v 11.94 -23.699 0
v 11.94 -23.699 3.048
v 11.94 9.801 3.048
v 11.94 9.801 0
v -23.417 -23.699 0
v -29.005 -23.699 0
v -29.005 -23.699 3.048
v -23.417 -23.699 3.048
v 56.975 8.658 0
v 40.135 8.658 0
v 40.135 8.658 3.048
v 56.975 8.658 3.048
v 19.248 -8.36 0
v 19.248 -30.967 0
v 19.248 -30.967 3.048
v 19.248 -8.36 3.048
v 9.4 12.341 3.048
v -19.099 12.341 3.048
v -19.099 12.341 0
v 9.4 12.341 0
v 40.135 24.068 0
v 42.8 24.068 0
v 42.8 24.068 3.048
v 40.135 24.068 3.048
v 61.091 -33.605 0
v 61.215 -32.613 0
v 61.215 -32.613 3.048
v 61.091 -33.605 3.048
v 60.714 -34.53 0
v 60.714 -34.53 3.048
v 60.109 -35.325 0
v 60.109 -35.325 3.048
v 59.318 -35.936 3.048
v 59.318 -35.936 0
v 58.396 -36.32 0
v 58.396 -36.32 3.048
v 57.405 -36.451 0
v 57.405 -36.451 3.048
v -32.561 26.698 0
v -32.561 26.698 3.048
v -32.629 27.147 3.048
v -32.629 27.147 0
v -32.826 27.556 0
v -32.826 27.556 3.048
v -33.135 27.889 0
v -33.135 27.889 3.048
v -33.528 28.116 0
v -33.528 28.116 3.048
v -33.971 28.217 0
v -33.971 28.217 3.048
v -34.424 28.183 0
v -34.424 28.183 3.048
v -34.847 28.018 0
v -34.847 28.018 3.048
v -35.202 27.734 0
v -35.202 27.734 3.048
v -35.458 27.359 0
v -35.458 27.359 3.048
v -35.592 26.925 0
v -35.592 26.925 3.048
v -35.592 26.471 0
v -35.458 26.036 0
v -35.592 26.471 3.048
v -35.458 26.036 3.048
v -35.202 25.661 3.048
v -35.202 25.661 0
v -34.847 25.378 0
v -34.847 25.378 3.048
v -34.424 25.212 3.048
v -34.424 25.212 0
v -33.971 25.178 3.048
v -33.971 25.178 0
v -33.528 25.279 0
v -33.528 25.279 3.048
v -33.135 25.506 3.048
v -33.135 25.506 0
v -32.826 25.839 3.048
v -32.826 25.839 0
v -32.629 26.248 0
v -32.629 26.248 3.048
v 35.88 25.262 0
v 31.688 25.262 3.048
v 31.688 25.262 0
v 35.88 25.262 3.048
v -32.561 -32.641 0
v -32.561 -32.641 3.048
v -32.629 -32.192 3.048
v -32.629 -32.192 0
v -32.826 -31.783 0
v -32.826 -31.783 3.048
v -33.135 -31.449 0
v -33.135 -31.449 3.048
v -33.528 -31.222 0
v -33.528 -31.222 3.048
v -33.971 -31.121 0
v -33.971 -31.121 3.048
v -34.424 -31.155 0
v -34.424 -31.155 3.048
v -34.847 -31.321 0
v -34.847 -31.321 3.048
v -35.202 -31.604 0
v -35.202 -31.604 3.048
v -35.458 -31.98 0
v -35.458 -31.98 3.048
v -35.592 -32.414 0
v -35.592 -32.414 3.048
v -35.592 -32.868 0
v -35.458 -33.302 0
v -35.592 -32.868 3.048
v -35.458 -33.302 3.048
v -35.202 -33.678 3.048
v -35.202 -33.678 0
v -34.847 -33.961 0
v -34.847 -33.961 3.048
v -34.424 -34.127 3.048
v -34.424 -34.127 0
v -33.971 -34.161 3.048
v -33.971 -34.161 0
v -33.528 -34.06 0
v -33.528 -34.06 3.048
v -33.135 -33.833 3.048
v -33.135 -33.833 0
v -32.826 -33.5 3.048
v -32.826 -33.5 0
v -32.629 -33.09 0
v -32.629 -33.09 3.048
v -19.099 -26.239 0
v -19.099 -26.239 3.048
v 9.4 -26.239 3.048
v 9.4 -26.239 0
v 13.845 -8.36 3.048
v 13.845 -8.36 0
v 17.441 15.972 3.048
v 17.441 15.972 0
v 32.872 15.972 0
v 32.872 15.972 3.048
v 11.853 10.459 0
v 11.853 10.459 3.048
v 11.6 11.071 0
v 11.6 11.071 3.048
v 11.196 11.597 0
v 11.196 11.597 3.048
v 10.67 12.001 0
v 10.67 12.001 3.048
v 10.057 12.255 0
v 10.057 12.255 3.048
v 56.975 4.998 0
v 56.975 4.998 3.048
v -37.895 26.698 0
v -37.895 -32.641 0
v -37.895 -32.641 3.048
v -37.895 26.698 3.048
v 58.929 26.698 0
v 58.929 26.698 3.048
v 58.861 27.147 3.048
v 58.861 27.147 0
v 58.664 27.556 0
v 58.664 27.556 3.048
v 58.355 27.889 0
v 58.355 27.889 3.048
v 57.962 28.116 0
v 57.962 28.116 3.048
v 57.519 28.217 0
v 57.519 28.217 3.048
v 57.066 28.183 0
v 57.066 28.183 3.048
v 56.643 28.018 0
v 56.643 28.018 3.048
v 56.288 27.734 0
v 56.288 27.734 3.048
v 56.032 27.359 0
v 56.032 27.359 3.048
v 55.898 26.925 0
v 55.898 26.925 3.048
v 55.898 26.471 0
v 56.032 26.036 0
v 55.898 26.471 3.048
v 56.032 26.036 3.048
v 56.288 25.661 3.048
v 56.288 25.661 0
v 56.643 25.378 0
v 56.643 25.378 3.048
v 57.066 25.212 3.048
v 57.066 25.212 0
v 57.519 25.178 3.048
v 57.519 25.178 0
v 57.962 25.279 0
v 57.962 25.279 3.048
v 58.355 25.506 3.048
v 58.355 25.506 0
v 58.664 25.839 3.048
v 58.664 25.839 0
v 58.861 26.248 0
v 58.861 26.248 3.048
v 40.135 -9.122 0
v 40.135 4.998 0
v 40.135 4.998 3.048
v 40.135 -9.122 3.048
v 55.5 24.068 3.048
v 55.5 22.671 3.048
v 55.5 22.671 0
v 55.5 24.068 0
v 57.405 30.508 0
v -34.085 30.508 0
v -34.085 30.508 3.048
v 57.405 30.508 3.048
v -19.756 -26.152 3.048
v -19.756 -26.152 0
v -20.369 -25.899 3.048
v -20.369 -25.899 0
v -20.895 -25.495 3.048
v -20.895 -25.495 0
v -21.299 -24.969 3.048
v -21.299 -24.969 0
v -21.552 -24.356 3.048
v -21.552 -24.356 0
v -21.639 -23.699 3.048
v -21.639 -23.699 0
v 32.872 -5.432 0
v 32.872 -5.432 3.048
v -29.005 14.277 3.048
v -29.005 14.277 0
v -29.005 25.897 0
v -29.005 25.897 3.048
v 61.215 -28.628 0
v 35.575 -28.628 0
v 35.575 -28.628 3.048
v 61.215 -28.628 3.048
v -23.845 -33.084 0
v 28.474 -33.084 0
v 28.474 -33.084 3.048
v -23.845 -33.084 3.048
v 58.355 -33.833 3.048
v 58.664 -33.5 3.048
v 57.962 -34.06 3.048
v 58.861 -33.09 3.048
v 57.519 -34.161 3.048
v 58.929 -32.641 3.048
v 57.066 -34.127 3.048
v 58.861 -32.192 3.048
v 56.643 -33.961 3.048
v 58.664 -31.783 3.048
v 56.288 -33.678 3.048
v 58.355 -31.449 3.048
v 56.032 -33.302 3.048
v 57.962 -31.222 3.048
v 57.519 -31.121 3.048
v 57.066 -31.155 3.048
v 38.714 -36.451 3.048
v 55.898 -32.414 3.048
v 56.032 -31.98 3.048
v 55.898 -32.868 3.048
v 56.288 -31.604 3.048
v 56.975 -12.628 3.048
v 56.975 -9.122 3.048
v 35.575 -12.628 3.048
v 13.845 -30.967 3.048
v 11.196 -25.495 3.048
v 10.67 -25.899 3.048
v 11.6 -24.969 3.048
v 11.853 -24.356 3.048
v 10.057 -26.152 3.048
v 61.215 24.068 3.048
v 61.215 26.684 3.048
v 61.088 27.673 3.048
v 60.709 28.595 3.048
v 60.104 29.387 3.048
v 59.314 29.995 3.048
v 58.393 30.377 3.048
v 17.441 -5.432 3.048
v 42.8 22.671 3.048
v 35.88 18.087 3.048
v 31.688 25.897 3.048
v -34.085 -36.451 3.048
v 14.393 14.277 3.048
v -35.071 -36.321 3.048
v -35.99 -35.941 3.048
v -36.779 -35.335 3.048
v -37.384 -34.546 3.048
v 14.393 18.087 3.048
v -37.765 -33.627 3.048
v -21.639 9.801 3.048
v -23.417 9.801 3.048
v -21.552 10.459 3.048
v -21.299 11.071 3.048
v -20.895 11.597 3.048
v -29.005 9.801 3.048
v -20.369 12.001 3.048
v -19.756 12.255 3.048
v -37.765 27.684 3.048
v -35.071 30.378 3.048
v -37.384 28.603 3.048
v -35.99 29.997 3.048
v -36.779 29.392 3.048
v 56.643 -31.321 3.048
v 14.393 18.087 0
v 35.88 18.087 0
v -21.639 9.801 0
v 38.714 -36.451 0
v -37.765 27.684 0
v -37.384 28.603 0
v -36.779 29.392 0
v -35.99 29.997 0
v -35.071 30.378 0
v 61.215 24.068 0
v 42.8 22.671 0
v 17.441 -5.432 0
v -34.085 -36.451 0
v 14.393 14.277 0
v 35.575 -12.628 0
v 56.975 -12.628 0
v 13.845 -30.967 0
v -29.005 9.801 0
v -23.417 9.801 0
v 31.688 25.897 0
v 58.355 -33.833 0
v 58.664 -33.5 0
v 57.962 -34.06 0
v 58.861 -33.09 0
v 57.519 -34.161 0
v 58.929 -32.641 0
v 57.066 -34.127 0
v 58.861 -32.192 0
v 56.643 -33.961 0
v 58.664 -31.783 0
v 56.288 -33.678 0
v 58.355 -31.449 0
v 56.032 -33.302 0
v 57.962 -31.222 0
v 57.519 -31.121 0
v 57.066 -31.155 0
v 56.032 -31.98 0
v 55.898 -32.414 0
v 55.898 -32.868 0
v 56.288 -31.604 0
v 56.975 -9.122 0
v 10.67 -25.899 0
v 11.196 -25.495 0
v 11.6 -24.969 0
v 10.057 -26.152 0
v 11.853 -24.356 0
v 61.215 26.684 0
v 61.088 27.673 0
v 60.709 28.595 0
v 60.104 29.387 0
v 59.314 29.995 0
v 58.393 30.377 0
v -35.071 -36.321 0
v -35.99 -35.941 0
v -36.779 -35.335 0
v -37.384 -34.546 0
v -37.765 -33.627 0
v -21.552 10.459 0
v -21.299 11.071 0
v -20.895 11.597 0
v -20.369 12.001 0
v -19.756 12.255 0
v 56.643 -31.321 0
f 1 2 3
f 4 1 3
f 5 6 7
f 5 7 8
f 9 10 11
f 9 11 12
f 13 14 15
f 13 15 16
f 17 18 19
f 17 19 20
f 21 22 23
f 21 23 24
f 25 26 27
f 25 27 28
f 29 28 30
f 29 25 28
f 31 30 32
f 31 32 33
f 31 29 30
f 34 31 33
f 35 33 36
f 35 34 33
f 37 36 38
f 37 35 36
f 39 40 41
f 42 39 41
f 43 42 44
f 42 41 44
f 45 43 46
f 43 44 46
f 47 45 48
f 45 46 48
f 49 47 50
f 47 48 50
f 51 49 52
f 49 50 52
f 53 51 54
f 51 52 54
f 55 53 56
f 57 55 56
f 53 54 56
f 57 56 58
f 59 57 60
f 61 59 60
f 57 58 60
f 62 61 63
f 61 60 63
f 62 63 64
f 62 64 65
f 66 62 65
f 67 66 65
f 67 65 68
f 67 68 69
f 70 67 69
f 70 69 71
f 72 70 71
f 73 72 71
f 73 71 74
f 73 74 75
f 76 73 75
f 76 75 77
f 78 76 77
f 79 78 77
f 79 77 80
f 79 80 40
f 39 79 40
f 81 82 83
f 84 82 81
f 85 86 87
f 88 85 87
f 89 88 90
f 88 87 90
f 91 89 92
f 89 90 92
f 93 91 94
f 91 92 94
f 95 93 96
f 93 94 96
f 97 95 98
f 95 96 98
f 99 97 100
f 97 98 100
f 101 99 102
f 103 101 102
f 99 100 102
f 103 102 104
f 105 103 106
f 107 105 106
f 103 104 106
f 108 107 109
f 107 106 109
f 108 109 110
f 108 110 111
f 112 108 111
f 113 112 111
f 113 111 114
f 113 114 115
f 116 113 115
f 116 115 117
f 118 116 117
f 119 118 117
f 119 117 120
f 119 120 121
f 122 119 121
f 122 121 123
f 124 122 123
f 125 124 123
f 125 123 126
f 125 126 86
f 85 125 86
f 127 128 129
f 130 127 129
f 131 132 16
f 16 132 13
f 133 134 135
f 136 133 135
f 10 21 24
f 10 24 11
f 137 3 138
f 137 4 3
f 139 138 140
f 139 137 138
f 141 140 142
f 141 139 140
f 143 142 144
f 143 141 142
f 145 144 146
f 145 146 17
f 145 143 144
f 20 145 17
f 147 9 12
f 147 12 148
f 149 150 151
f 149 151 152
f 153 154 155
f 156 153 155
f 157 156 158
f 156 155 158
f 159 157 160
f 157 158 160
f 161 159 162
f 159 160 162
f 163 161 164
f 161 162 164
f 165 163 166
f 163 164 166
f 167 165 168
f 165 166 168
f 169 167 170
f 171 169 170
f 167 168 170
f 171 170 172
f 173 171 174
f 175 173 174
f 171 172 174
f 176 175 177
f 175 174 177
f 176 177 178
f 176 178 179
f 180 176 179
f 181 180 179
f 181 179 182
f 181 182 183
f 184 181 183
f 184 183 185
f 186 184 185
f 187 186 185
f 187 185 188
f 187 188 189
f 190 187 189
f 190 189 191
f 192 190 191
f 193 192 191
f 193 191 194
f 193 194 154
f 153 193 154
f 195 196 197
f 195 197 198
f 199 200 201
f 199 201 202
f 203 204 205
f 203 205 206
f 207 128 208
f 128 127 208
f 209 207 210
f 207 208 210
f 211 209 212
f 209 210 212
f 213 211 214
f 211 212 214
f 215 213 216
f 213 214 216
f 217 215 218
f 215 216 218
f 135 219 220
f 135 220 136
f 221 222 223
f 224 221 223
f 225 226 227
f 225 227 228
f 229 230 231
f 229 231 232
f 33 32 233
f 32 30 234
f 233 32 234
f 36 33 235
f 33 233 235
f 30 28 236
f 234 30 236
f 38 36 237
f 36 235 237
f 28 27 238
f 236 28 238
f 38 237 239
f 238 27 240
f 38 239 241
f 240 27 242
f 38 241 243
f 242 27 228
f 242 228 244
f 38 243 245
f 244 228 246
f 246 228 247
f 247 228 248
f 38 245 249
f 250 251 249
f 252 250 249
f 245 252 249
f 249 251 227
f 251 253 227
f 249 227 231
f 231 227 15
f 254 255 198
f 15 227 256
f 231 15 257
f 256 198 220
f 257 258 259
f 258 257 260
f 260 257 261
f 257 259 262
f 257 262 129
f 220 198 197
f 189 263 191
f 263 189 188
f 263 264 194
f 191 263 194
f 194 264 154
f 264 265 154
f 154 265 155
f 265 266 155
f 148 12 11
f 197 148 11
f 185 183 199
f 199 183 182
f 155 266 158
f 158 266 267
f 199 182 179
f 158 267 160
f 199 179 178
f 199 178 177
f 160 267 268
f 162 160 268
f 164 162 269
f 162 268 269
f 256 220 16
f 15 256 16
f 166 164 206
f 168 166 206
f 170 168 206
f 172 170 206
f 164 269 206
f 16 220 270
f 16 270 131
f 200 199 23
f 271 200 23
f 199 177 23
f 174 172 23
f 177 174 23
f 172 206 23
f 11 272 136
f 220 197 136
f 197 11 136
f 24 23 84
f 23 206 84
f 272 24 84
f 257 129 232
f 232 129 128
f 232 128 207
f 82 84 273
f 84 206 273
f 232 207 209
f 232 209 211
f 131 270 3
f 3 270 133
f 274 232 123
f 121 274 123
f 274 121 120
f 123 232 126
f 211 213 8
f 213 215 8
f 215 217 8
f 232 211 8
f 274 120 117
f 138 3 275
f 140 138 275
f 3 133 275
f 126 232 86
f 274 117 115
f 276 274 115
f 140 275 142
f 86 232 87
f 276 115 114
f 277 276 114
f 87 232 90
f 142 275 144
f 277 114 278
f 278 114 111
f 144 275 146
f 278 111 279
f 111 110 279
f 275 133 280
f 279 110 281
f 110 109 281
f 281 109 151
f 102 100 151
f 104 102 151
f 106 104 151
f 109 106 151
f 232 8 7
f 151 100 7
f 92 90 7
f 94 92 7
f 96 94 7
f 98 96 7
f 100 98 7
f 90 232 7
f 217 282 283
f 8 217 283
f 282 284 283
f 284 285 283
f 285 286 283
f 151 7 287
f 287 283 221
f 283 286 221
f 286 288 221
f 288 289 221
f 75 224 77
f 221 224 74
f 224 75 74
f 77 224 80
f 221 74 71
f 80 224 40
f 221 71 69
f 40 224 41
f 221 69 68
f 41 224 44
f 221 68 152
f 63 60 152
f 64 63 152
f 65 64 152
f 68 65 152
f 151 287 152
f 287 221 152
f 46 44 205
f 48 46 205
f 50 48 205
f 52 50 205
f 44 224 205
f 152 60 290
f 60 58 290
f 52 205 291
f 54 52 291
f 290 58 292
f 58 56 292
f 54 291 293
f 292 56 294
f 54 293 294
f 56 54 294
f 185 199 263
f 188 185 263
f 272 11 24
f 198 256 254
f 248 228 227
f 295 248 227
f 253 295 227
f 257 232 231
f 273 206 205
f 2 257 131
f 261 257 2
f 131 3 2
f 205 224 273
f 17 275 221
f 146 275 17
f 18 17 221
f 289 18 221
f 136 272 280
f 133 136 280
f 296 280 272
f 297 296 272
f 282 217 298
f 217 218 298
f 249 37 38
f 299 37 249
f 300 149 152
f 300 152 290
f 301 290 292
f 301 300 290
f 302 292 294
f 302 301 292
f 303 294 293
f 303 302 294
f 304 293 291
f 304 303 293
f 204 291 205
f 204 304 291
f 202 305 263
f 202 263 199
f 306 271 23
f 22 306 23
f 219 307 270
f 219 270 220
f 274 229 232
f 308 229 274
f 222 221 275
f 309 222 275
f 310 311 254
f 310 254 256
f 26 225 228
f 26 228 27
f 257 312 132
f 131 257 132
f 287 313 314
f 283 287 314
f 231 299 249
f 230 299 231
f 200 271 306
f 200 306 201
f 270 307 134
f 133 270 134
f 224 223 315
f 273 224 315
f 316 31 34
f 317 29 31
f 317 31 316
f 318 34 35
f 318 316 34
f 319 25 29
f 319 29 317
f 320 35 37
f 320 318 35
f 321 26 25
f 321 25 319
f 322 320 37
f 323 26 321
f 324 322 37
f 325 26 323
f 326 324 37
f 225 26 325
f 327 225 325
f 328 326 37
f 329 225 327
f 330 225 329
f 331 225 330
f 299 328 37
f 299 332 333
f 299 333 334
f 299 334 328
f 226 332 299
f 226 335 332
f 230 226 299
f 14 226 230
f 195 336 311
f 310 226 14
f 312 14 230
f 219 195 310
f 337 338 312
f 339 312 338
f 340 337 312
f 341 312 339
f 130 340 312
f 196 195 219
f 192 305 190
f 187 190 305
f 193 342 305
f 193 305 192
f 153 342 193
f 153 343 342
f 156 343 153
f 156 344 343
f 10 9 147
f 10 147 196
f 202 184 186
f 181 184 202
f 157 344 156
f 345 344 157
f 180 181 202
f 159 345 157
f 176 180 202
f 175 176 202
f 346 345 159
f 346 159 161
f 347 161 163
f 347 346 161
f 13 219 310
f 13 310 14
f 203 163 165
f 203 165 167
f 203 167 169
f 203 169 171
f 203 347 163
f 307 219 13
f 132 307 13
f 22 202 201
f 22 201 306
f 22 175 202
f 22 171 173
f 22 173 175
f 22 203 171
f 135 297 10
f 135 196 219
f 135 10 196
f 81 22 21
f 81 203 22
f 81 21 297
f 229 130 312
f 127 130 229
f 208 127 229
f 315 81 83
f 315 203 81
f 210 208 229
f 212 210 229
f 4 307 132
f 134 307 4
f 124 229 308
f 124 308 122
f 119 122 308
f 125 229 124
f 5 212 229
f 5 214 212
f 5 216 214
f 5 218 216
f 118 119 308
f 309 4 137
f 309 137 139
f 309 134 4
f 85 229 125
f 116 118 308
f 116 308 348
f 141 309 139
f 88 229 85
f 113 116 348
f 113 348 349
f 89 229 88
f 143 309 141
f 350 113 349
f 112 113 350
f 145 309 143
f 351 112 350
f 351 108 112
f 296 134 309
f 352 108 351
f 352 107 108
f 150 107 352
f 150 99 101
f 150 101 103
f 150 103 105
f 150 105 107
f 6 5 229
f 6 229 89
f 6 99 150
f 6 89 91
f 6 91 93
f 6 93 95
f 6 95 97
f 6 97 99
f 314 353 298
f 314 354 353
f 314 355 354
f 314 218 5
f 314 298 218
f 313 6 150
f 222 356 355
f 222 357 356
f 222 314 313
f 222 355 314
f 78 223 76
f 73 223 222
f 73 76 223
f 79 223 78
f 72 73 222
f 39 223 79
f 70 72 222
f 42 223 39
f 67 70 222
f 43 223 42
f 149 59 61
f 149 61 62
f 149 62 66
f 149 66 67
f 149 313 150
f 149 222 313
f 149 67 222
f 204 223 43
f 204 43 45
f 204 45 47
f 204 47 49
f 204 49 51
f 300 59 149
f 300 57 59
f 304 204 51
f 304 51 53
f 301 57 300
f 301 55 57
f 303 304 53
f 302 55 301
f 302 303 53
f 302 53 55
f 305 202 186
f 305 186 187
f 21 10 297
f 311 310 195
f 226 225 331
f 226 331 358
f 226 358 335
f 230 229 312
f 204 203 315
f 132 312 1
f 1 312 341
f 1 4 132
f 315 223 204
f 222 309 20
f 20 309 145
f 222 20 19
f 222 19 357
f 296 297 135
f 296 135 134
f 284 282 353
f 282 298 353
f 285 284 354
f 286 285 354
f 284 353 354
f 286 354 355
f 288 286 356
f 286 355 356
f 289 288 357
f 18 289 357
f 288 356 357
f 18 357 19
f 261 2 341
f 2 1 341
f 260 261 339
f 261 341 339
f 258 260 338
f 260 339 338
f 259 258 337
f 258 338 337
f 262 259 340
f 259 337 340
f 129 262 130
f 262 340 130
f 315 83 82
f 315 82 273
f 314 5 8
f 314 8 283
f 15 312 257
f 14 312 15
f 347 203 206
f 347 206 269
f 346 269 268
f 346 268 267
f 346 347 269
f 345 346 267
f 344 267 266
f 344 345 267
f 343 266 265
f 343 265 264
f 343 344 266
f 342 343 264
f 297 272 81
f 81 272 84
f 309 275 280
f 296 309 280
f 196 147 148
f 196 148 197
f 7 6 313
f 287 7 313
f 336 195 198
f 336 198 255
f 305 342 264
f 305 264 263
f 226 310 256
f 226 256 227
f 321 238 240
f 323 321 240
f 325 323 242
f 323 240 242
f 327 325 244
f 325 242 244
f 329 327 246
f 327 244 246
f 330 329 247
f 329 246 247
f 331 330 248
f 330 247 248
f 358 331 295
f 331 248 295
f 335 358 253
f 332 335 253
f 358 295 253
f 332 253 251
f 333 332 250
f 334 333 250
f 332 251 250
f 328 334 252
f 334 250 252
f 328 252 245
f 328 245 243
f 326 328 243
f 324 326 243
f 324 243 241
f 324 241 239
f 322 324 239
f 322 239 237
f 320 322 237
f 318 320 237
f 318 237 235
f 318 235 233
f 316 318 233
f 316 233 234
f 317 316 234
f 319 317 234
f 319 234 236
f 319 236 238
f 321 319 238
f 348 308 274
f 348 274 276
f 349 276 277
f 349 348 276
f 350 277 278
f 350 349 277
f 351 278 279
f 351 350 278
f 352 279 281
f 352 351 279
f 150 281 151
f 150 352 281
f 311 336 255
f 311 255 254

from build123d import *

# Parameters (mm, degrees)
SKETCH1_R           = 1.3462
SKETCH1_W           = 5.4034
SKETCH1_H           = 22.6066
SKETCH1_W_2         = 60.6932
SKETCH1_H_2         = 7.81
SKETCH1_W_3         = 15.431
SKETCH1_H_3         = 21.4039
SKETCH1_W_4         = 31.9679
SKETCH1_H_4         = 18.2371
SKETCH1_W_5         = 5.588
SKETCH1_H_5         = 33.5001
BOSS_EXTRUDE1_DEPTH = 3.048
SKETCH2_W           = 33.5789
SKETCH2_H           = 38.5801
CUT_EXTRUDE1_DEPTH  = 4.048
FILLET1_R           = 2.54
SKETCH3_R           = 1.524
CUT_EXTRUDE2_DEPTH  = 4.048
SKETCH4_W           = 43.3979
SKETCH4_H           = 3.81
CUT_EXTRUDE3_DEPTH  = 4.048
SKETCH5_W           = 12.7
SKETCH5_H           = 1.397
BOSS_EXTRUDE2_DEPTH = 3.048
SKETCH6_W           = 4.1917
SKETCH6_H           = 7.175
CUT_EXTRUDE4_DEPTH  = 4.048


with BuildPart() as part:
    # Sketch1 → Boss-Extrude1 (new body)
    with BuildSketch(Plane.XY):
        with BuildLine():
            Line((61.214907375, 24.068294304), (40.134807375, 24.068294304))
            Line((40.134807375, 24.068294304), (40.134807375, 8.658194304))
            Line((40.134807375, 8.658194304), (56.975007375, 8.658194304))
            Line((56.975007375, 8.658194304), (56.975007375, 4.997894304))
            Line((56.975007375, 4.997894304), (40.134807375, 4.997894304))
            Line((40.134807375, 4.997894304), (40.134807375, -9.121805696))
            Line((40.134807375, -9.121805696), (56.975007375, -9.121805696))
            Line((56.975007375, -9.121805696), (56.975007375, -12.628005696))
            Line((56.975007375, -12.628005696), (35.575007375, -12.628005696))
            Line((35.575007375, -12.628005696), (35.575007375, -28.627805696))
            Line((35.575007375, -28.627805696), (61.214907375, -28.627805696))
            Line((61.214907375, -28.627805696), (61.214907375, -32.613401529))
            ThreePointArc((61.214907375, -32.613401529), (60.108826144, -35.325305244), (57.405007375, -36.451005696))
            Line((57.405007375, -36.451005696), (38.714307375, -36.451005696))
            Line((38.714307375, -36.451005696), (28.474307375, -33.084405696))
            Line((28.474307375, -33.084405696), (-23.844892625, -33.084405696))
            Line((-23.844892625, -33.084405696), (-34.084892625, -36.451005696))
            ThreePointArc((-34.084892625, -36.451005696), (-36.778969461, -35.335082532), (-37.894892625, -32.641005696))
            Line((-37.894892625, -32.641005696), (-37.894892625, 26.697694304))
            ThreePointArc((-37.894892625, 26.697694304), (-36.778969461, 29.391771141), (-34.084892625, 30.507694304))
            Line((-34.084892625, 30.507694304), (57.404932375, 30.507694304))
            ThreePointArc((57.404932375, 30.507694304), (60.103884597, 29.386886916), (61.214907375, 26.683892153))
            Line((61.214907375, 26.683892153), (61.214907375, 24.068294304))
        make_face()
        with Locations((57.404932375, 26.697694304)):
            Circle(SKETCH1_R, mode=Mode.SUBTRACT)
        with Locations((57.405007375, -32.641005696)):
            Circle(SKETCH1_R, mode=Mode.SUBTRACT)
        with Locations((-34.084892625, -32.641005696)):
            Circle(SKETCH1_R, mode=Mode.SUBTRACT)
        with Locations((-34.084892625, 26.697694304)):
            Circle(SKETCH1_R, mode=Mode.SUBTRACT)
        with Locations((16.546707375, -19.663505696)):
            Rectangle(SKETCH1_W, SKETCH1_H, mode=Mode.SUBTRACT)
        with Locations((1.341707375, 21.991994304)):
            Rectangle(SKETCH1_W_2, SKETCH1_H_2, mode=Mode.SUBTRACT)
        with Locations((25.156507375, 5.270444304)):
            Rectangle(SKETCH1_W_3, SKETCH1_H_3, mode=Mode.SUBTRACT)
        with Locations((-5.654942625, 1.475544304)):
            Rectangle(SKETCH1_W_4, SKETCH1_H_4, mode=Mode.SUBTRACT)
        with Locations((-26.210892625, -6.948855696)):
            Rectangle(SKETCH1_W_5, SKETCH1_H_5, mode=Mode.SUBTRACT)
    extrude(amount=BOSS_EXTRUDE1_DEPTH)

    # Sketch2 → Cut-Extrude1 (cut, through all)
    with BuildSketch(Plane.XY.offset(3.048)):
        with Locations((-4.849442625, -6.948855696)):
            Rectangle(SKETCH2_W, SKETCH2_H)
    extrude(amount=-CUT_EXTRUDE1_DEPTH, mode=Mode.SUBTRACT)

    # Fillet1
    fillet1_edges = [part.edges().sort_by_distance(p)[0] for p in [
        (-21.638892625, -26.238905696, 1.524),
        (11.940007375, 12.341194304, 1.524),
        (11.940007375, -26.238905696, 1.524),
        (-21.638892625, 12.341194304, 1.524),
    ]]
    fillet(fillet1_edges, radius=FILLET1_R)

    # Sketch3 → Cut-Extrude2 (cut, through all)
    with BuildSketch(Plane.XY.offset(3.048)):
        with Locations((-34.084892625, 26.697694304)):
            Circle(SKETCH3_R)
        with Locations((57.404932375, 26.697694304)):
            Circle(SKETCH3_R)
        with Locations((57.405007375, -32.641005696)):
            Circle(SKETCH3_R)
        with Locations((-34.084892625, -32.641005696)):
            Circle(SKETCH3_R)
    extrude(amount=-CUT_EXTRUDE2_DEPTH, mode=Mode.SUBTRACT)

    # Sketch4 → Cut-Extrude3 (cut, through all)
    with BuildSketch(Plane.XY.offset(3.048)):
        with Locations((-7.305942625, 16.181994304)):
            Rectangle(SKETCH4_W, SKETCH4_H)
    extrude(amount=-CUT_EXTRUDE3_DEPTH, mode=Mode.SUBTRACT)

    # Sketch5 → Boss-Extrude2 (add)
    with BuildSketch(Plane.XY.offset(3.048)):
        with Locations((49.149907375, 23.369794304)):
            Rectangle(SKETCH5_W, SKETCH5_H)
    extrude(amount=-BOSS_EXTRUDE2_DEPTH)

    # Sketch6 → Cut-Extrude4 (cut, through all)
    with BuildSketch(Plane.XY.offset(3.048)):
        with Locations((33.784157375, 21.674494304)):
            Rectangle(SKETCH6_W, SKETCH6_H)
    extrude(amount=-CUT_EXTRUDE4_DEPTH, mode=Mode.SUBTRACT)


solid = part.part
